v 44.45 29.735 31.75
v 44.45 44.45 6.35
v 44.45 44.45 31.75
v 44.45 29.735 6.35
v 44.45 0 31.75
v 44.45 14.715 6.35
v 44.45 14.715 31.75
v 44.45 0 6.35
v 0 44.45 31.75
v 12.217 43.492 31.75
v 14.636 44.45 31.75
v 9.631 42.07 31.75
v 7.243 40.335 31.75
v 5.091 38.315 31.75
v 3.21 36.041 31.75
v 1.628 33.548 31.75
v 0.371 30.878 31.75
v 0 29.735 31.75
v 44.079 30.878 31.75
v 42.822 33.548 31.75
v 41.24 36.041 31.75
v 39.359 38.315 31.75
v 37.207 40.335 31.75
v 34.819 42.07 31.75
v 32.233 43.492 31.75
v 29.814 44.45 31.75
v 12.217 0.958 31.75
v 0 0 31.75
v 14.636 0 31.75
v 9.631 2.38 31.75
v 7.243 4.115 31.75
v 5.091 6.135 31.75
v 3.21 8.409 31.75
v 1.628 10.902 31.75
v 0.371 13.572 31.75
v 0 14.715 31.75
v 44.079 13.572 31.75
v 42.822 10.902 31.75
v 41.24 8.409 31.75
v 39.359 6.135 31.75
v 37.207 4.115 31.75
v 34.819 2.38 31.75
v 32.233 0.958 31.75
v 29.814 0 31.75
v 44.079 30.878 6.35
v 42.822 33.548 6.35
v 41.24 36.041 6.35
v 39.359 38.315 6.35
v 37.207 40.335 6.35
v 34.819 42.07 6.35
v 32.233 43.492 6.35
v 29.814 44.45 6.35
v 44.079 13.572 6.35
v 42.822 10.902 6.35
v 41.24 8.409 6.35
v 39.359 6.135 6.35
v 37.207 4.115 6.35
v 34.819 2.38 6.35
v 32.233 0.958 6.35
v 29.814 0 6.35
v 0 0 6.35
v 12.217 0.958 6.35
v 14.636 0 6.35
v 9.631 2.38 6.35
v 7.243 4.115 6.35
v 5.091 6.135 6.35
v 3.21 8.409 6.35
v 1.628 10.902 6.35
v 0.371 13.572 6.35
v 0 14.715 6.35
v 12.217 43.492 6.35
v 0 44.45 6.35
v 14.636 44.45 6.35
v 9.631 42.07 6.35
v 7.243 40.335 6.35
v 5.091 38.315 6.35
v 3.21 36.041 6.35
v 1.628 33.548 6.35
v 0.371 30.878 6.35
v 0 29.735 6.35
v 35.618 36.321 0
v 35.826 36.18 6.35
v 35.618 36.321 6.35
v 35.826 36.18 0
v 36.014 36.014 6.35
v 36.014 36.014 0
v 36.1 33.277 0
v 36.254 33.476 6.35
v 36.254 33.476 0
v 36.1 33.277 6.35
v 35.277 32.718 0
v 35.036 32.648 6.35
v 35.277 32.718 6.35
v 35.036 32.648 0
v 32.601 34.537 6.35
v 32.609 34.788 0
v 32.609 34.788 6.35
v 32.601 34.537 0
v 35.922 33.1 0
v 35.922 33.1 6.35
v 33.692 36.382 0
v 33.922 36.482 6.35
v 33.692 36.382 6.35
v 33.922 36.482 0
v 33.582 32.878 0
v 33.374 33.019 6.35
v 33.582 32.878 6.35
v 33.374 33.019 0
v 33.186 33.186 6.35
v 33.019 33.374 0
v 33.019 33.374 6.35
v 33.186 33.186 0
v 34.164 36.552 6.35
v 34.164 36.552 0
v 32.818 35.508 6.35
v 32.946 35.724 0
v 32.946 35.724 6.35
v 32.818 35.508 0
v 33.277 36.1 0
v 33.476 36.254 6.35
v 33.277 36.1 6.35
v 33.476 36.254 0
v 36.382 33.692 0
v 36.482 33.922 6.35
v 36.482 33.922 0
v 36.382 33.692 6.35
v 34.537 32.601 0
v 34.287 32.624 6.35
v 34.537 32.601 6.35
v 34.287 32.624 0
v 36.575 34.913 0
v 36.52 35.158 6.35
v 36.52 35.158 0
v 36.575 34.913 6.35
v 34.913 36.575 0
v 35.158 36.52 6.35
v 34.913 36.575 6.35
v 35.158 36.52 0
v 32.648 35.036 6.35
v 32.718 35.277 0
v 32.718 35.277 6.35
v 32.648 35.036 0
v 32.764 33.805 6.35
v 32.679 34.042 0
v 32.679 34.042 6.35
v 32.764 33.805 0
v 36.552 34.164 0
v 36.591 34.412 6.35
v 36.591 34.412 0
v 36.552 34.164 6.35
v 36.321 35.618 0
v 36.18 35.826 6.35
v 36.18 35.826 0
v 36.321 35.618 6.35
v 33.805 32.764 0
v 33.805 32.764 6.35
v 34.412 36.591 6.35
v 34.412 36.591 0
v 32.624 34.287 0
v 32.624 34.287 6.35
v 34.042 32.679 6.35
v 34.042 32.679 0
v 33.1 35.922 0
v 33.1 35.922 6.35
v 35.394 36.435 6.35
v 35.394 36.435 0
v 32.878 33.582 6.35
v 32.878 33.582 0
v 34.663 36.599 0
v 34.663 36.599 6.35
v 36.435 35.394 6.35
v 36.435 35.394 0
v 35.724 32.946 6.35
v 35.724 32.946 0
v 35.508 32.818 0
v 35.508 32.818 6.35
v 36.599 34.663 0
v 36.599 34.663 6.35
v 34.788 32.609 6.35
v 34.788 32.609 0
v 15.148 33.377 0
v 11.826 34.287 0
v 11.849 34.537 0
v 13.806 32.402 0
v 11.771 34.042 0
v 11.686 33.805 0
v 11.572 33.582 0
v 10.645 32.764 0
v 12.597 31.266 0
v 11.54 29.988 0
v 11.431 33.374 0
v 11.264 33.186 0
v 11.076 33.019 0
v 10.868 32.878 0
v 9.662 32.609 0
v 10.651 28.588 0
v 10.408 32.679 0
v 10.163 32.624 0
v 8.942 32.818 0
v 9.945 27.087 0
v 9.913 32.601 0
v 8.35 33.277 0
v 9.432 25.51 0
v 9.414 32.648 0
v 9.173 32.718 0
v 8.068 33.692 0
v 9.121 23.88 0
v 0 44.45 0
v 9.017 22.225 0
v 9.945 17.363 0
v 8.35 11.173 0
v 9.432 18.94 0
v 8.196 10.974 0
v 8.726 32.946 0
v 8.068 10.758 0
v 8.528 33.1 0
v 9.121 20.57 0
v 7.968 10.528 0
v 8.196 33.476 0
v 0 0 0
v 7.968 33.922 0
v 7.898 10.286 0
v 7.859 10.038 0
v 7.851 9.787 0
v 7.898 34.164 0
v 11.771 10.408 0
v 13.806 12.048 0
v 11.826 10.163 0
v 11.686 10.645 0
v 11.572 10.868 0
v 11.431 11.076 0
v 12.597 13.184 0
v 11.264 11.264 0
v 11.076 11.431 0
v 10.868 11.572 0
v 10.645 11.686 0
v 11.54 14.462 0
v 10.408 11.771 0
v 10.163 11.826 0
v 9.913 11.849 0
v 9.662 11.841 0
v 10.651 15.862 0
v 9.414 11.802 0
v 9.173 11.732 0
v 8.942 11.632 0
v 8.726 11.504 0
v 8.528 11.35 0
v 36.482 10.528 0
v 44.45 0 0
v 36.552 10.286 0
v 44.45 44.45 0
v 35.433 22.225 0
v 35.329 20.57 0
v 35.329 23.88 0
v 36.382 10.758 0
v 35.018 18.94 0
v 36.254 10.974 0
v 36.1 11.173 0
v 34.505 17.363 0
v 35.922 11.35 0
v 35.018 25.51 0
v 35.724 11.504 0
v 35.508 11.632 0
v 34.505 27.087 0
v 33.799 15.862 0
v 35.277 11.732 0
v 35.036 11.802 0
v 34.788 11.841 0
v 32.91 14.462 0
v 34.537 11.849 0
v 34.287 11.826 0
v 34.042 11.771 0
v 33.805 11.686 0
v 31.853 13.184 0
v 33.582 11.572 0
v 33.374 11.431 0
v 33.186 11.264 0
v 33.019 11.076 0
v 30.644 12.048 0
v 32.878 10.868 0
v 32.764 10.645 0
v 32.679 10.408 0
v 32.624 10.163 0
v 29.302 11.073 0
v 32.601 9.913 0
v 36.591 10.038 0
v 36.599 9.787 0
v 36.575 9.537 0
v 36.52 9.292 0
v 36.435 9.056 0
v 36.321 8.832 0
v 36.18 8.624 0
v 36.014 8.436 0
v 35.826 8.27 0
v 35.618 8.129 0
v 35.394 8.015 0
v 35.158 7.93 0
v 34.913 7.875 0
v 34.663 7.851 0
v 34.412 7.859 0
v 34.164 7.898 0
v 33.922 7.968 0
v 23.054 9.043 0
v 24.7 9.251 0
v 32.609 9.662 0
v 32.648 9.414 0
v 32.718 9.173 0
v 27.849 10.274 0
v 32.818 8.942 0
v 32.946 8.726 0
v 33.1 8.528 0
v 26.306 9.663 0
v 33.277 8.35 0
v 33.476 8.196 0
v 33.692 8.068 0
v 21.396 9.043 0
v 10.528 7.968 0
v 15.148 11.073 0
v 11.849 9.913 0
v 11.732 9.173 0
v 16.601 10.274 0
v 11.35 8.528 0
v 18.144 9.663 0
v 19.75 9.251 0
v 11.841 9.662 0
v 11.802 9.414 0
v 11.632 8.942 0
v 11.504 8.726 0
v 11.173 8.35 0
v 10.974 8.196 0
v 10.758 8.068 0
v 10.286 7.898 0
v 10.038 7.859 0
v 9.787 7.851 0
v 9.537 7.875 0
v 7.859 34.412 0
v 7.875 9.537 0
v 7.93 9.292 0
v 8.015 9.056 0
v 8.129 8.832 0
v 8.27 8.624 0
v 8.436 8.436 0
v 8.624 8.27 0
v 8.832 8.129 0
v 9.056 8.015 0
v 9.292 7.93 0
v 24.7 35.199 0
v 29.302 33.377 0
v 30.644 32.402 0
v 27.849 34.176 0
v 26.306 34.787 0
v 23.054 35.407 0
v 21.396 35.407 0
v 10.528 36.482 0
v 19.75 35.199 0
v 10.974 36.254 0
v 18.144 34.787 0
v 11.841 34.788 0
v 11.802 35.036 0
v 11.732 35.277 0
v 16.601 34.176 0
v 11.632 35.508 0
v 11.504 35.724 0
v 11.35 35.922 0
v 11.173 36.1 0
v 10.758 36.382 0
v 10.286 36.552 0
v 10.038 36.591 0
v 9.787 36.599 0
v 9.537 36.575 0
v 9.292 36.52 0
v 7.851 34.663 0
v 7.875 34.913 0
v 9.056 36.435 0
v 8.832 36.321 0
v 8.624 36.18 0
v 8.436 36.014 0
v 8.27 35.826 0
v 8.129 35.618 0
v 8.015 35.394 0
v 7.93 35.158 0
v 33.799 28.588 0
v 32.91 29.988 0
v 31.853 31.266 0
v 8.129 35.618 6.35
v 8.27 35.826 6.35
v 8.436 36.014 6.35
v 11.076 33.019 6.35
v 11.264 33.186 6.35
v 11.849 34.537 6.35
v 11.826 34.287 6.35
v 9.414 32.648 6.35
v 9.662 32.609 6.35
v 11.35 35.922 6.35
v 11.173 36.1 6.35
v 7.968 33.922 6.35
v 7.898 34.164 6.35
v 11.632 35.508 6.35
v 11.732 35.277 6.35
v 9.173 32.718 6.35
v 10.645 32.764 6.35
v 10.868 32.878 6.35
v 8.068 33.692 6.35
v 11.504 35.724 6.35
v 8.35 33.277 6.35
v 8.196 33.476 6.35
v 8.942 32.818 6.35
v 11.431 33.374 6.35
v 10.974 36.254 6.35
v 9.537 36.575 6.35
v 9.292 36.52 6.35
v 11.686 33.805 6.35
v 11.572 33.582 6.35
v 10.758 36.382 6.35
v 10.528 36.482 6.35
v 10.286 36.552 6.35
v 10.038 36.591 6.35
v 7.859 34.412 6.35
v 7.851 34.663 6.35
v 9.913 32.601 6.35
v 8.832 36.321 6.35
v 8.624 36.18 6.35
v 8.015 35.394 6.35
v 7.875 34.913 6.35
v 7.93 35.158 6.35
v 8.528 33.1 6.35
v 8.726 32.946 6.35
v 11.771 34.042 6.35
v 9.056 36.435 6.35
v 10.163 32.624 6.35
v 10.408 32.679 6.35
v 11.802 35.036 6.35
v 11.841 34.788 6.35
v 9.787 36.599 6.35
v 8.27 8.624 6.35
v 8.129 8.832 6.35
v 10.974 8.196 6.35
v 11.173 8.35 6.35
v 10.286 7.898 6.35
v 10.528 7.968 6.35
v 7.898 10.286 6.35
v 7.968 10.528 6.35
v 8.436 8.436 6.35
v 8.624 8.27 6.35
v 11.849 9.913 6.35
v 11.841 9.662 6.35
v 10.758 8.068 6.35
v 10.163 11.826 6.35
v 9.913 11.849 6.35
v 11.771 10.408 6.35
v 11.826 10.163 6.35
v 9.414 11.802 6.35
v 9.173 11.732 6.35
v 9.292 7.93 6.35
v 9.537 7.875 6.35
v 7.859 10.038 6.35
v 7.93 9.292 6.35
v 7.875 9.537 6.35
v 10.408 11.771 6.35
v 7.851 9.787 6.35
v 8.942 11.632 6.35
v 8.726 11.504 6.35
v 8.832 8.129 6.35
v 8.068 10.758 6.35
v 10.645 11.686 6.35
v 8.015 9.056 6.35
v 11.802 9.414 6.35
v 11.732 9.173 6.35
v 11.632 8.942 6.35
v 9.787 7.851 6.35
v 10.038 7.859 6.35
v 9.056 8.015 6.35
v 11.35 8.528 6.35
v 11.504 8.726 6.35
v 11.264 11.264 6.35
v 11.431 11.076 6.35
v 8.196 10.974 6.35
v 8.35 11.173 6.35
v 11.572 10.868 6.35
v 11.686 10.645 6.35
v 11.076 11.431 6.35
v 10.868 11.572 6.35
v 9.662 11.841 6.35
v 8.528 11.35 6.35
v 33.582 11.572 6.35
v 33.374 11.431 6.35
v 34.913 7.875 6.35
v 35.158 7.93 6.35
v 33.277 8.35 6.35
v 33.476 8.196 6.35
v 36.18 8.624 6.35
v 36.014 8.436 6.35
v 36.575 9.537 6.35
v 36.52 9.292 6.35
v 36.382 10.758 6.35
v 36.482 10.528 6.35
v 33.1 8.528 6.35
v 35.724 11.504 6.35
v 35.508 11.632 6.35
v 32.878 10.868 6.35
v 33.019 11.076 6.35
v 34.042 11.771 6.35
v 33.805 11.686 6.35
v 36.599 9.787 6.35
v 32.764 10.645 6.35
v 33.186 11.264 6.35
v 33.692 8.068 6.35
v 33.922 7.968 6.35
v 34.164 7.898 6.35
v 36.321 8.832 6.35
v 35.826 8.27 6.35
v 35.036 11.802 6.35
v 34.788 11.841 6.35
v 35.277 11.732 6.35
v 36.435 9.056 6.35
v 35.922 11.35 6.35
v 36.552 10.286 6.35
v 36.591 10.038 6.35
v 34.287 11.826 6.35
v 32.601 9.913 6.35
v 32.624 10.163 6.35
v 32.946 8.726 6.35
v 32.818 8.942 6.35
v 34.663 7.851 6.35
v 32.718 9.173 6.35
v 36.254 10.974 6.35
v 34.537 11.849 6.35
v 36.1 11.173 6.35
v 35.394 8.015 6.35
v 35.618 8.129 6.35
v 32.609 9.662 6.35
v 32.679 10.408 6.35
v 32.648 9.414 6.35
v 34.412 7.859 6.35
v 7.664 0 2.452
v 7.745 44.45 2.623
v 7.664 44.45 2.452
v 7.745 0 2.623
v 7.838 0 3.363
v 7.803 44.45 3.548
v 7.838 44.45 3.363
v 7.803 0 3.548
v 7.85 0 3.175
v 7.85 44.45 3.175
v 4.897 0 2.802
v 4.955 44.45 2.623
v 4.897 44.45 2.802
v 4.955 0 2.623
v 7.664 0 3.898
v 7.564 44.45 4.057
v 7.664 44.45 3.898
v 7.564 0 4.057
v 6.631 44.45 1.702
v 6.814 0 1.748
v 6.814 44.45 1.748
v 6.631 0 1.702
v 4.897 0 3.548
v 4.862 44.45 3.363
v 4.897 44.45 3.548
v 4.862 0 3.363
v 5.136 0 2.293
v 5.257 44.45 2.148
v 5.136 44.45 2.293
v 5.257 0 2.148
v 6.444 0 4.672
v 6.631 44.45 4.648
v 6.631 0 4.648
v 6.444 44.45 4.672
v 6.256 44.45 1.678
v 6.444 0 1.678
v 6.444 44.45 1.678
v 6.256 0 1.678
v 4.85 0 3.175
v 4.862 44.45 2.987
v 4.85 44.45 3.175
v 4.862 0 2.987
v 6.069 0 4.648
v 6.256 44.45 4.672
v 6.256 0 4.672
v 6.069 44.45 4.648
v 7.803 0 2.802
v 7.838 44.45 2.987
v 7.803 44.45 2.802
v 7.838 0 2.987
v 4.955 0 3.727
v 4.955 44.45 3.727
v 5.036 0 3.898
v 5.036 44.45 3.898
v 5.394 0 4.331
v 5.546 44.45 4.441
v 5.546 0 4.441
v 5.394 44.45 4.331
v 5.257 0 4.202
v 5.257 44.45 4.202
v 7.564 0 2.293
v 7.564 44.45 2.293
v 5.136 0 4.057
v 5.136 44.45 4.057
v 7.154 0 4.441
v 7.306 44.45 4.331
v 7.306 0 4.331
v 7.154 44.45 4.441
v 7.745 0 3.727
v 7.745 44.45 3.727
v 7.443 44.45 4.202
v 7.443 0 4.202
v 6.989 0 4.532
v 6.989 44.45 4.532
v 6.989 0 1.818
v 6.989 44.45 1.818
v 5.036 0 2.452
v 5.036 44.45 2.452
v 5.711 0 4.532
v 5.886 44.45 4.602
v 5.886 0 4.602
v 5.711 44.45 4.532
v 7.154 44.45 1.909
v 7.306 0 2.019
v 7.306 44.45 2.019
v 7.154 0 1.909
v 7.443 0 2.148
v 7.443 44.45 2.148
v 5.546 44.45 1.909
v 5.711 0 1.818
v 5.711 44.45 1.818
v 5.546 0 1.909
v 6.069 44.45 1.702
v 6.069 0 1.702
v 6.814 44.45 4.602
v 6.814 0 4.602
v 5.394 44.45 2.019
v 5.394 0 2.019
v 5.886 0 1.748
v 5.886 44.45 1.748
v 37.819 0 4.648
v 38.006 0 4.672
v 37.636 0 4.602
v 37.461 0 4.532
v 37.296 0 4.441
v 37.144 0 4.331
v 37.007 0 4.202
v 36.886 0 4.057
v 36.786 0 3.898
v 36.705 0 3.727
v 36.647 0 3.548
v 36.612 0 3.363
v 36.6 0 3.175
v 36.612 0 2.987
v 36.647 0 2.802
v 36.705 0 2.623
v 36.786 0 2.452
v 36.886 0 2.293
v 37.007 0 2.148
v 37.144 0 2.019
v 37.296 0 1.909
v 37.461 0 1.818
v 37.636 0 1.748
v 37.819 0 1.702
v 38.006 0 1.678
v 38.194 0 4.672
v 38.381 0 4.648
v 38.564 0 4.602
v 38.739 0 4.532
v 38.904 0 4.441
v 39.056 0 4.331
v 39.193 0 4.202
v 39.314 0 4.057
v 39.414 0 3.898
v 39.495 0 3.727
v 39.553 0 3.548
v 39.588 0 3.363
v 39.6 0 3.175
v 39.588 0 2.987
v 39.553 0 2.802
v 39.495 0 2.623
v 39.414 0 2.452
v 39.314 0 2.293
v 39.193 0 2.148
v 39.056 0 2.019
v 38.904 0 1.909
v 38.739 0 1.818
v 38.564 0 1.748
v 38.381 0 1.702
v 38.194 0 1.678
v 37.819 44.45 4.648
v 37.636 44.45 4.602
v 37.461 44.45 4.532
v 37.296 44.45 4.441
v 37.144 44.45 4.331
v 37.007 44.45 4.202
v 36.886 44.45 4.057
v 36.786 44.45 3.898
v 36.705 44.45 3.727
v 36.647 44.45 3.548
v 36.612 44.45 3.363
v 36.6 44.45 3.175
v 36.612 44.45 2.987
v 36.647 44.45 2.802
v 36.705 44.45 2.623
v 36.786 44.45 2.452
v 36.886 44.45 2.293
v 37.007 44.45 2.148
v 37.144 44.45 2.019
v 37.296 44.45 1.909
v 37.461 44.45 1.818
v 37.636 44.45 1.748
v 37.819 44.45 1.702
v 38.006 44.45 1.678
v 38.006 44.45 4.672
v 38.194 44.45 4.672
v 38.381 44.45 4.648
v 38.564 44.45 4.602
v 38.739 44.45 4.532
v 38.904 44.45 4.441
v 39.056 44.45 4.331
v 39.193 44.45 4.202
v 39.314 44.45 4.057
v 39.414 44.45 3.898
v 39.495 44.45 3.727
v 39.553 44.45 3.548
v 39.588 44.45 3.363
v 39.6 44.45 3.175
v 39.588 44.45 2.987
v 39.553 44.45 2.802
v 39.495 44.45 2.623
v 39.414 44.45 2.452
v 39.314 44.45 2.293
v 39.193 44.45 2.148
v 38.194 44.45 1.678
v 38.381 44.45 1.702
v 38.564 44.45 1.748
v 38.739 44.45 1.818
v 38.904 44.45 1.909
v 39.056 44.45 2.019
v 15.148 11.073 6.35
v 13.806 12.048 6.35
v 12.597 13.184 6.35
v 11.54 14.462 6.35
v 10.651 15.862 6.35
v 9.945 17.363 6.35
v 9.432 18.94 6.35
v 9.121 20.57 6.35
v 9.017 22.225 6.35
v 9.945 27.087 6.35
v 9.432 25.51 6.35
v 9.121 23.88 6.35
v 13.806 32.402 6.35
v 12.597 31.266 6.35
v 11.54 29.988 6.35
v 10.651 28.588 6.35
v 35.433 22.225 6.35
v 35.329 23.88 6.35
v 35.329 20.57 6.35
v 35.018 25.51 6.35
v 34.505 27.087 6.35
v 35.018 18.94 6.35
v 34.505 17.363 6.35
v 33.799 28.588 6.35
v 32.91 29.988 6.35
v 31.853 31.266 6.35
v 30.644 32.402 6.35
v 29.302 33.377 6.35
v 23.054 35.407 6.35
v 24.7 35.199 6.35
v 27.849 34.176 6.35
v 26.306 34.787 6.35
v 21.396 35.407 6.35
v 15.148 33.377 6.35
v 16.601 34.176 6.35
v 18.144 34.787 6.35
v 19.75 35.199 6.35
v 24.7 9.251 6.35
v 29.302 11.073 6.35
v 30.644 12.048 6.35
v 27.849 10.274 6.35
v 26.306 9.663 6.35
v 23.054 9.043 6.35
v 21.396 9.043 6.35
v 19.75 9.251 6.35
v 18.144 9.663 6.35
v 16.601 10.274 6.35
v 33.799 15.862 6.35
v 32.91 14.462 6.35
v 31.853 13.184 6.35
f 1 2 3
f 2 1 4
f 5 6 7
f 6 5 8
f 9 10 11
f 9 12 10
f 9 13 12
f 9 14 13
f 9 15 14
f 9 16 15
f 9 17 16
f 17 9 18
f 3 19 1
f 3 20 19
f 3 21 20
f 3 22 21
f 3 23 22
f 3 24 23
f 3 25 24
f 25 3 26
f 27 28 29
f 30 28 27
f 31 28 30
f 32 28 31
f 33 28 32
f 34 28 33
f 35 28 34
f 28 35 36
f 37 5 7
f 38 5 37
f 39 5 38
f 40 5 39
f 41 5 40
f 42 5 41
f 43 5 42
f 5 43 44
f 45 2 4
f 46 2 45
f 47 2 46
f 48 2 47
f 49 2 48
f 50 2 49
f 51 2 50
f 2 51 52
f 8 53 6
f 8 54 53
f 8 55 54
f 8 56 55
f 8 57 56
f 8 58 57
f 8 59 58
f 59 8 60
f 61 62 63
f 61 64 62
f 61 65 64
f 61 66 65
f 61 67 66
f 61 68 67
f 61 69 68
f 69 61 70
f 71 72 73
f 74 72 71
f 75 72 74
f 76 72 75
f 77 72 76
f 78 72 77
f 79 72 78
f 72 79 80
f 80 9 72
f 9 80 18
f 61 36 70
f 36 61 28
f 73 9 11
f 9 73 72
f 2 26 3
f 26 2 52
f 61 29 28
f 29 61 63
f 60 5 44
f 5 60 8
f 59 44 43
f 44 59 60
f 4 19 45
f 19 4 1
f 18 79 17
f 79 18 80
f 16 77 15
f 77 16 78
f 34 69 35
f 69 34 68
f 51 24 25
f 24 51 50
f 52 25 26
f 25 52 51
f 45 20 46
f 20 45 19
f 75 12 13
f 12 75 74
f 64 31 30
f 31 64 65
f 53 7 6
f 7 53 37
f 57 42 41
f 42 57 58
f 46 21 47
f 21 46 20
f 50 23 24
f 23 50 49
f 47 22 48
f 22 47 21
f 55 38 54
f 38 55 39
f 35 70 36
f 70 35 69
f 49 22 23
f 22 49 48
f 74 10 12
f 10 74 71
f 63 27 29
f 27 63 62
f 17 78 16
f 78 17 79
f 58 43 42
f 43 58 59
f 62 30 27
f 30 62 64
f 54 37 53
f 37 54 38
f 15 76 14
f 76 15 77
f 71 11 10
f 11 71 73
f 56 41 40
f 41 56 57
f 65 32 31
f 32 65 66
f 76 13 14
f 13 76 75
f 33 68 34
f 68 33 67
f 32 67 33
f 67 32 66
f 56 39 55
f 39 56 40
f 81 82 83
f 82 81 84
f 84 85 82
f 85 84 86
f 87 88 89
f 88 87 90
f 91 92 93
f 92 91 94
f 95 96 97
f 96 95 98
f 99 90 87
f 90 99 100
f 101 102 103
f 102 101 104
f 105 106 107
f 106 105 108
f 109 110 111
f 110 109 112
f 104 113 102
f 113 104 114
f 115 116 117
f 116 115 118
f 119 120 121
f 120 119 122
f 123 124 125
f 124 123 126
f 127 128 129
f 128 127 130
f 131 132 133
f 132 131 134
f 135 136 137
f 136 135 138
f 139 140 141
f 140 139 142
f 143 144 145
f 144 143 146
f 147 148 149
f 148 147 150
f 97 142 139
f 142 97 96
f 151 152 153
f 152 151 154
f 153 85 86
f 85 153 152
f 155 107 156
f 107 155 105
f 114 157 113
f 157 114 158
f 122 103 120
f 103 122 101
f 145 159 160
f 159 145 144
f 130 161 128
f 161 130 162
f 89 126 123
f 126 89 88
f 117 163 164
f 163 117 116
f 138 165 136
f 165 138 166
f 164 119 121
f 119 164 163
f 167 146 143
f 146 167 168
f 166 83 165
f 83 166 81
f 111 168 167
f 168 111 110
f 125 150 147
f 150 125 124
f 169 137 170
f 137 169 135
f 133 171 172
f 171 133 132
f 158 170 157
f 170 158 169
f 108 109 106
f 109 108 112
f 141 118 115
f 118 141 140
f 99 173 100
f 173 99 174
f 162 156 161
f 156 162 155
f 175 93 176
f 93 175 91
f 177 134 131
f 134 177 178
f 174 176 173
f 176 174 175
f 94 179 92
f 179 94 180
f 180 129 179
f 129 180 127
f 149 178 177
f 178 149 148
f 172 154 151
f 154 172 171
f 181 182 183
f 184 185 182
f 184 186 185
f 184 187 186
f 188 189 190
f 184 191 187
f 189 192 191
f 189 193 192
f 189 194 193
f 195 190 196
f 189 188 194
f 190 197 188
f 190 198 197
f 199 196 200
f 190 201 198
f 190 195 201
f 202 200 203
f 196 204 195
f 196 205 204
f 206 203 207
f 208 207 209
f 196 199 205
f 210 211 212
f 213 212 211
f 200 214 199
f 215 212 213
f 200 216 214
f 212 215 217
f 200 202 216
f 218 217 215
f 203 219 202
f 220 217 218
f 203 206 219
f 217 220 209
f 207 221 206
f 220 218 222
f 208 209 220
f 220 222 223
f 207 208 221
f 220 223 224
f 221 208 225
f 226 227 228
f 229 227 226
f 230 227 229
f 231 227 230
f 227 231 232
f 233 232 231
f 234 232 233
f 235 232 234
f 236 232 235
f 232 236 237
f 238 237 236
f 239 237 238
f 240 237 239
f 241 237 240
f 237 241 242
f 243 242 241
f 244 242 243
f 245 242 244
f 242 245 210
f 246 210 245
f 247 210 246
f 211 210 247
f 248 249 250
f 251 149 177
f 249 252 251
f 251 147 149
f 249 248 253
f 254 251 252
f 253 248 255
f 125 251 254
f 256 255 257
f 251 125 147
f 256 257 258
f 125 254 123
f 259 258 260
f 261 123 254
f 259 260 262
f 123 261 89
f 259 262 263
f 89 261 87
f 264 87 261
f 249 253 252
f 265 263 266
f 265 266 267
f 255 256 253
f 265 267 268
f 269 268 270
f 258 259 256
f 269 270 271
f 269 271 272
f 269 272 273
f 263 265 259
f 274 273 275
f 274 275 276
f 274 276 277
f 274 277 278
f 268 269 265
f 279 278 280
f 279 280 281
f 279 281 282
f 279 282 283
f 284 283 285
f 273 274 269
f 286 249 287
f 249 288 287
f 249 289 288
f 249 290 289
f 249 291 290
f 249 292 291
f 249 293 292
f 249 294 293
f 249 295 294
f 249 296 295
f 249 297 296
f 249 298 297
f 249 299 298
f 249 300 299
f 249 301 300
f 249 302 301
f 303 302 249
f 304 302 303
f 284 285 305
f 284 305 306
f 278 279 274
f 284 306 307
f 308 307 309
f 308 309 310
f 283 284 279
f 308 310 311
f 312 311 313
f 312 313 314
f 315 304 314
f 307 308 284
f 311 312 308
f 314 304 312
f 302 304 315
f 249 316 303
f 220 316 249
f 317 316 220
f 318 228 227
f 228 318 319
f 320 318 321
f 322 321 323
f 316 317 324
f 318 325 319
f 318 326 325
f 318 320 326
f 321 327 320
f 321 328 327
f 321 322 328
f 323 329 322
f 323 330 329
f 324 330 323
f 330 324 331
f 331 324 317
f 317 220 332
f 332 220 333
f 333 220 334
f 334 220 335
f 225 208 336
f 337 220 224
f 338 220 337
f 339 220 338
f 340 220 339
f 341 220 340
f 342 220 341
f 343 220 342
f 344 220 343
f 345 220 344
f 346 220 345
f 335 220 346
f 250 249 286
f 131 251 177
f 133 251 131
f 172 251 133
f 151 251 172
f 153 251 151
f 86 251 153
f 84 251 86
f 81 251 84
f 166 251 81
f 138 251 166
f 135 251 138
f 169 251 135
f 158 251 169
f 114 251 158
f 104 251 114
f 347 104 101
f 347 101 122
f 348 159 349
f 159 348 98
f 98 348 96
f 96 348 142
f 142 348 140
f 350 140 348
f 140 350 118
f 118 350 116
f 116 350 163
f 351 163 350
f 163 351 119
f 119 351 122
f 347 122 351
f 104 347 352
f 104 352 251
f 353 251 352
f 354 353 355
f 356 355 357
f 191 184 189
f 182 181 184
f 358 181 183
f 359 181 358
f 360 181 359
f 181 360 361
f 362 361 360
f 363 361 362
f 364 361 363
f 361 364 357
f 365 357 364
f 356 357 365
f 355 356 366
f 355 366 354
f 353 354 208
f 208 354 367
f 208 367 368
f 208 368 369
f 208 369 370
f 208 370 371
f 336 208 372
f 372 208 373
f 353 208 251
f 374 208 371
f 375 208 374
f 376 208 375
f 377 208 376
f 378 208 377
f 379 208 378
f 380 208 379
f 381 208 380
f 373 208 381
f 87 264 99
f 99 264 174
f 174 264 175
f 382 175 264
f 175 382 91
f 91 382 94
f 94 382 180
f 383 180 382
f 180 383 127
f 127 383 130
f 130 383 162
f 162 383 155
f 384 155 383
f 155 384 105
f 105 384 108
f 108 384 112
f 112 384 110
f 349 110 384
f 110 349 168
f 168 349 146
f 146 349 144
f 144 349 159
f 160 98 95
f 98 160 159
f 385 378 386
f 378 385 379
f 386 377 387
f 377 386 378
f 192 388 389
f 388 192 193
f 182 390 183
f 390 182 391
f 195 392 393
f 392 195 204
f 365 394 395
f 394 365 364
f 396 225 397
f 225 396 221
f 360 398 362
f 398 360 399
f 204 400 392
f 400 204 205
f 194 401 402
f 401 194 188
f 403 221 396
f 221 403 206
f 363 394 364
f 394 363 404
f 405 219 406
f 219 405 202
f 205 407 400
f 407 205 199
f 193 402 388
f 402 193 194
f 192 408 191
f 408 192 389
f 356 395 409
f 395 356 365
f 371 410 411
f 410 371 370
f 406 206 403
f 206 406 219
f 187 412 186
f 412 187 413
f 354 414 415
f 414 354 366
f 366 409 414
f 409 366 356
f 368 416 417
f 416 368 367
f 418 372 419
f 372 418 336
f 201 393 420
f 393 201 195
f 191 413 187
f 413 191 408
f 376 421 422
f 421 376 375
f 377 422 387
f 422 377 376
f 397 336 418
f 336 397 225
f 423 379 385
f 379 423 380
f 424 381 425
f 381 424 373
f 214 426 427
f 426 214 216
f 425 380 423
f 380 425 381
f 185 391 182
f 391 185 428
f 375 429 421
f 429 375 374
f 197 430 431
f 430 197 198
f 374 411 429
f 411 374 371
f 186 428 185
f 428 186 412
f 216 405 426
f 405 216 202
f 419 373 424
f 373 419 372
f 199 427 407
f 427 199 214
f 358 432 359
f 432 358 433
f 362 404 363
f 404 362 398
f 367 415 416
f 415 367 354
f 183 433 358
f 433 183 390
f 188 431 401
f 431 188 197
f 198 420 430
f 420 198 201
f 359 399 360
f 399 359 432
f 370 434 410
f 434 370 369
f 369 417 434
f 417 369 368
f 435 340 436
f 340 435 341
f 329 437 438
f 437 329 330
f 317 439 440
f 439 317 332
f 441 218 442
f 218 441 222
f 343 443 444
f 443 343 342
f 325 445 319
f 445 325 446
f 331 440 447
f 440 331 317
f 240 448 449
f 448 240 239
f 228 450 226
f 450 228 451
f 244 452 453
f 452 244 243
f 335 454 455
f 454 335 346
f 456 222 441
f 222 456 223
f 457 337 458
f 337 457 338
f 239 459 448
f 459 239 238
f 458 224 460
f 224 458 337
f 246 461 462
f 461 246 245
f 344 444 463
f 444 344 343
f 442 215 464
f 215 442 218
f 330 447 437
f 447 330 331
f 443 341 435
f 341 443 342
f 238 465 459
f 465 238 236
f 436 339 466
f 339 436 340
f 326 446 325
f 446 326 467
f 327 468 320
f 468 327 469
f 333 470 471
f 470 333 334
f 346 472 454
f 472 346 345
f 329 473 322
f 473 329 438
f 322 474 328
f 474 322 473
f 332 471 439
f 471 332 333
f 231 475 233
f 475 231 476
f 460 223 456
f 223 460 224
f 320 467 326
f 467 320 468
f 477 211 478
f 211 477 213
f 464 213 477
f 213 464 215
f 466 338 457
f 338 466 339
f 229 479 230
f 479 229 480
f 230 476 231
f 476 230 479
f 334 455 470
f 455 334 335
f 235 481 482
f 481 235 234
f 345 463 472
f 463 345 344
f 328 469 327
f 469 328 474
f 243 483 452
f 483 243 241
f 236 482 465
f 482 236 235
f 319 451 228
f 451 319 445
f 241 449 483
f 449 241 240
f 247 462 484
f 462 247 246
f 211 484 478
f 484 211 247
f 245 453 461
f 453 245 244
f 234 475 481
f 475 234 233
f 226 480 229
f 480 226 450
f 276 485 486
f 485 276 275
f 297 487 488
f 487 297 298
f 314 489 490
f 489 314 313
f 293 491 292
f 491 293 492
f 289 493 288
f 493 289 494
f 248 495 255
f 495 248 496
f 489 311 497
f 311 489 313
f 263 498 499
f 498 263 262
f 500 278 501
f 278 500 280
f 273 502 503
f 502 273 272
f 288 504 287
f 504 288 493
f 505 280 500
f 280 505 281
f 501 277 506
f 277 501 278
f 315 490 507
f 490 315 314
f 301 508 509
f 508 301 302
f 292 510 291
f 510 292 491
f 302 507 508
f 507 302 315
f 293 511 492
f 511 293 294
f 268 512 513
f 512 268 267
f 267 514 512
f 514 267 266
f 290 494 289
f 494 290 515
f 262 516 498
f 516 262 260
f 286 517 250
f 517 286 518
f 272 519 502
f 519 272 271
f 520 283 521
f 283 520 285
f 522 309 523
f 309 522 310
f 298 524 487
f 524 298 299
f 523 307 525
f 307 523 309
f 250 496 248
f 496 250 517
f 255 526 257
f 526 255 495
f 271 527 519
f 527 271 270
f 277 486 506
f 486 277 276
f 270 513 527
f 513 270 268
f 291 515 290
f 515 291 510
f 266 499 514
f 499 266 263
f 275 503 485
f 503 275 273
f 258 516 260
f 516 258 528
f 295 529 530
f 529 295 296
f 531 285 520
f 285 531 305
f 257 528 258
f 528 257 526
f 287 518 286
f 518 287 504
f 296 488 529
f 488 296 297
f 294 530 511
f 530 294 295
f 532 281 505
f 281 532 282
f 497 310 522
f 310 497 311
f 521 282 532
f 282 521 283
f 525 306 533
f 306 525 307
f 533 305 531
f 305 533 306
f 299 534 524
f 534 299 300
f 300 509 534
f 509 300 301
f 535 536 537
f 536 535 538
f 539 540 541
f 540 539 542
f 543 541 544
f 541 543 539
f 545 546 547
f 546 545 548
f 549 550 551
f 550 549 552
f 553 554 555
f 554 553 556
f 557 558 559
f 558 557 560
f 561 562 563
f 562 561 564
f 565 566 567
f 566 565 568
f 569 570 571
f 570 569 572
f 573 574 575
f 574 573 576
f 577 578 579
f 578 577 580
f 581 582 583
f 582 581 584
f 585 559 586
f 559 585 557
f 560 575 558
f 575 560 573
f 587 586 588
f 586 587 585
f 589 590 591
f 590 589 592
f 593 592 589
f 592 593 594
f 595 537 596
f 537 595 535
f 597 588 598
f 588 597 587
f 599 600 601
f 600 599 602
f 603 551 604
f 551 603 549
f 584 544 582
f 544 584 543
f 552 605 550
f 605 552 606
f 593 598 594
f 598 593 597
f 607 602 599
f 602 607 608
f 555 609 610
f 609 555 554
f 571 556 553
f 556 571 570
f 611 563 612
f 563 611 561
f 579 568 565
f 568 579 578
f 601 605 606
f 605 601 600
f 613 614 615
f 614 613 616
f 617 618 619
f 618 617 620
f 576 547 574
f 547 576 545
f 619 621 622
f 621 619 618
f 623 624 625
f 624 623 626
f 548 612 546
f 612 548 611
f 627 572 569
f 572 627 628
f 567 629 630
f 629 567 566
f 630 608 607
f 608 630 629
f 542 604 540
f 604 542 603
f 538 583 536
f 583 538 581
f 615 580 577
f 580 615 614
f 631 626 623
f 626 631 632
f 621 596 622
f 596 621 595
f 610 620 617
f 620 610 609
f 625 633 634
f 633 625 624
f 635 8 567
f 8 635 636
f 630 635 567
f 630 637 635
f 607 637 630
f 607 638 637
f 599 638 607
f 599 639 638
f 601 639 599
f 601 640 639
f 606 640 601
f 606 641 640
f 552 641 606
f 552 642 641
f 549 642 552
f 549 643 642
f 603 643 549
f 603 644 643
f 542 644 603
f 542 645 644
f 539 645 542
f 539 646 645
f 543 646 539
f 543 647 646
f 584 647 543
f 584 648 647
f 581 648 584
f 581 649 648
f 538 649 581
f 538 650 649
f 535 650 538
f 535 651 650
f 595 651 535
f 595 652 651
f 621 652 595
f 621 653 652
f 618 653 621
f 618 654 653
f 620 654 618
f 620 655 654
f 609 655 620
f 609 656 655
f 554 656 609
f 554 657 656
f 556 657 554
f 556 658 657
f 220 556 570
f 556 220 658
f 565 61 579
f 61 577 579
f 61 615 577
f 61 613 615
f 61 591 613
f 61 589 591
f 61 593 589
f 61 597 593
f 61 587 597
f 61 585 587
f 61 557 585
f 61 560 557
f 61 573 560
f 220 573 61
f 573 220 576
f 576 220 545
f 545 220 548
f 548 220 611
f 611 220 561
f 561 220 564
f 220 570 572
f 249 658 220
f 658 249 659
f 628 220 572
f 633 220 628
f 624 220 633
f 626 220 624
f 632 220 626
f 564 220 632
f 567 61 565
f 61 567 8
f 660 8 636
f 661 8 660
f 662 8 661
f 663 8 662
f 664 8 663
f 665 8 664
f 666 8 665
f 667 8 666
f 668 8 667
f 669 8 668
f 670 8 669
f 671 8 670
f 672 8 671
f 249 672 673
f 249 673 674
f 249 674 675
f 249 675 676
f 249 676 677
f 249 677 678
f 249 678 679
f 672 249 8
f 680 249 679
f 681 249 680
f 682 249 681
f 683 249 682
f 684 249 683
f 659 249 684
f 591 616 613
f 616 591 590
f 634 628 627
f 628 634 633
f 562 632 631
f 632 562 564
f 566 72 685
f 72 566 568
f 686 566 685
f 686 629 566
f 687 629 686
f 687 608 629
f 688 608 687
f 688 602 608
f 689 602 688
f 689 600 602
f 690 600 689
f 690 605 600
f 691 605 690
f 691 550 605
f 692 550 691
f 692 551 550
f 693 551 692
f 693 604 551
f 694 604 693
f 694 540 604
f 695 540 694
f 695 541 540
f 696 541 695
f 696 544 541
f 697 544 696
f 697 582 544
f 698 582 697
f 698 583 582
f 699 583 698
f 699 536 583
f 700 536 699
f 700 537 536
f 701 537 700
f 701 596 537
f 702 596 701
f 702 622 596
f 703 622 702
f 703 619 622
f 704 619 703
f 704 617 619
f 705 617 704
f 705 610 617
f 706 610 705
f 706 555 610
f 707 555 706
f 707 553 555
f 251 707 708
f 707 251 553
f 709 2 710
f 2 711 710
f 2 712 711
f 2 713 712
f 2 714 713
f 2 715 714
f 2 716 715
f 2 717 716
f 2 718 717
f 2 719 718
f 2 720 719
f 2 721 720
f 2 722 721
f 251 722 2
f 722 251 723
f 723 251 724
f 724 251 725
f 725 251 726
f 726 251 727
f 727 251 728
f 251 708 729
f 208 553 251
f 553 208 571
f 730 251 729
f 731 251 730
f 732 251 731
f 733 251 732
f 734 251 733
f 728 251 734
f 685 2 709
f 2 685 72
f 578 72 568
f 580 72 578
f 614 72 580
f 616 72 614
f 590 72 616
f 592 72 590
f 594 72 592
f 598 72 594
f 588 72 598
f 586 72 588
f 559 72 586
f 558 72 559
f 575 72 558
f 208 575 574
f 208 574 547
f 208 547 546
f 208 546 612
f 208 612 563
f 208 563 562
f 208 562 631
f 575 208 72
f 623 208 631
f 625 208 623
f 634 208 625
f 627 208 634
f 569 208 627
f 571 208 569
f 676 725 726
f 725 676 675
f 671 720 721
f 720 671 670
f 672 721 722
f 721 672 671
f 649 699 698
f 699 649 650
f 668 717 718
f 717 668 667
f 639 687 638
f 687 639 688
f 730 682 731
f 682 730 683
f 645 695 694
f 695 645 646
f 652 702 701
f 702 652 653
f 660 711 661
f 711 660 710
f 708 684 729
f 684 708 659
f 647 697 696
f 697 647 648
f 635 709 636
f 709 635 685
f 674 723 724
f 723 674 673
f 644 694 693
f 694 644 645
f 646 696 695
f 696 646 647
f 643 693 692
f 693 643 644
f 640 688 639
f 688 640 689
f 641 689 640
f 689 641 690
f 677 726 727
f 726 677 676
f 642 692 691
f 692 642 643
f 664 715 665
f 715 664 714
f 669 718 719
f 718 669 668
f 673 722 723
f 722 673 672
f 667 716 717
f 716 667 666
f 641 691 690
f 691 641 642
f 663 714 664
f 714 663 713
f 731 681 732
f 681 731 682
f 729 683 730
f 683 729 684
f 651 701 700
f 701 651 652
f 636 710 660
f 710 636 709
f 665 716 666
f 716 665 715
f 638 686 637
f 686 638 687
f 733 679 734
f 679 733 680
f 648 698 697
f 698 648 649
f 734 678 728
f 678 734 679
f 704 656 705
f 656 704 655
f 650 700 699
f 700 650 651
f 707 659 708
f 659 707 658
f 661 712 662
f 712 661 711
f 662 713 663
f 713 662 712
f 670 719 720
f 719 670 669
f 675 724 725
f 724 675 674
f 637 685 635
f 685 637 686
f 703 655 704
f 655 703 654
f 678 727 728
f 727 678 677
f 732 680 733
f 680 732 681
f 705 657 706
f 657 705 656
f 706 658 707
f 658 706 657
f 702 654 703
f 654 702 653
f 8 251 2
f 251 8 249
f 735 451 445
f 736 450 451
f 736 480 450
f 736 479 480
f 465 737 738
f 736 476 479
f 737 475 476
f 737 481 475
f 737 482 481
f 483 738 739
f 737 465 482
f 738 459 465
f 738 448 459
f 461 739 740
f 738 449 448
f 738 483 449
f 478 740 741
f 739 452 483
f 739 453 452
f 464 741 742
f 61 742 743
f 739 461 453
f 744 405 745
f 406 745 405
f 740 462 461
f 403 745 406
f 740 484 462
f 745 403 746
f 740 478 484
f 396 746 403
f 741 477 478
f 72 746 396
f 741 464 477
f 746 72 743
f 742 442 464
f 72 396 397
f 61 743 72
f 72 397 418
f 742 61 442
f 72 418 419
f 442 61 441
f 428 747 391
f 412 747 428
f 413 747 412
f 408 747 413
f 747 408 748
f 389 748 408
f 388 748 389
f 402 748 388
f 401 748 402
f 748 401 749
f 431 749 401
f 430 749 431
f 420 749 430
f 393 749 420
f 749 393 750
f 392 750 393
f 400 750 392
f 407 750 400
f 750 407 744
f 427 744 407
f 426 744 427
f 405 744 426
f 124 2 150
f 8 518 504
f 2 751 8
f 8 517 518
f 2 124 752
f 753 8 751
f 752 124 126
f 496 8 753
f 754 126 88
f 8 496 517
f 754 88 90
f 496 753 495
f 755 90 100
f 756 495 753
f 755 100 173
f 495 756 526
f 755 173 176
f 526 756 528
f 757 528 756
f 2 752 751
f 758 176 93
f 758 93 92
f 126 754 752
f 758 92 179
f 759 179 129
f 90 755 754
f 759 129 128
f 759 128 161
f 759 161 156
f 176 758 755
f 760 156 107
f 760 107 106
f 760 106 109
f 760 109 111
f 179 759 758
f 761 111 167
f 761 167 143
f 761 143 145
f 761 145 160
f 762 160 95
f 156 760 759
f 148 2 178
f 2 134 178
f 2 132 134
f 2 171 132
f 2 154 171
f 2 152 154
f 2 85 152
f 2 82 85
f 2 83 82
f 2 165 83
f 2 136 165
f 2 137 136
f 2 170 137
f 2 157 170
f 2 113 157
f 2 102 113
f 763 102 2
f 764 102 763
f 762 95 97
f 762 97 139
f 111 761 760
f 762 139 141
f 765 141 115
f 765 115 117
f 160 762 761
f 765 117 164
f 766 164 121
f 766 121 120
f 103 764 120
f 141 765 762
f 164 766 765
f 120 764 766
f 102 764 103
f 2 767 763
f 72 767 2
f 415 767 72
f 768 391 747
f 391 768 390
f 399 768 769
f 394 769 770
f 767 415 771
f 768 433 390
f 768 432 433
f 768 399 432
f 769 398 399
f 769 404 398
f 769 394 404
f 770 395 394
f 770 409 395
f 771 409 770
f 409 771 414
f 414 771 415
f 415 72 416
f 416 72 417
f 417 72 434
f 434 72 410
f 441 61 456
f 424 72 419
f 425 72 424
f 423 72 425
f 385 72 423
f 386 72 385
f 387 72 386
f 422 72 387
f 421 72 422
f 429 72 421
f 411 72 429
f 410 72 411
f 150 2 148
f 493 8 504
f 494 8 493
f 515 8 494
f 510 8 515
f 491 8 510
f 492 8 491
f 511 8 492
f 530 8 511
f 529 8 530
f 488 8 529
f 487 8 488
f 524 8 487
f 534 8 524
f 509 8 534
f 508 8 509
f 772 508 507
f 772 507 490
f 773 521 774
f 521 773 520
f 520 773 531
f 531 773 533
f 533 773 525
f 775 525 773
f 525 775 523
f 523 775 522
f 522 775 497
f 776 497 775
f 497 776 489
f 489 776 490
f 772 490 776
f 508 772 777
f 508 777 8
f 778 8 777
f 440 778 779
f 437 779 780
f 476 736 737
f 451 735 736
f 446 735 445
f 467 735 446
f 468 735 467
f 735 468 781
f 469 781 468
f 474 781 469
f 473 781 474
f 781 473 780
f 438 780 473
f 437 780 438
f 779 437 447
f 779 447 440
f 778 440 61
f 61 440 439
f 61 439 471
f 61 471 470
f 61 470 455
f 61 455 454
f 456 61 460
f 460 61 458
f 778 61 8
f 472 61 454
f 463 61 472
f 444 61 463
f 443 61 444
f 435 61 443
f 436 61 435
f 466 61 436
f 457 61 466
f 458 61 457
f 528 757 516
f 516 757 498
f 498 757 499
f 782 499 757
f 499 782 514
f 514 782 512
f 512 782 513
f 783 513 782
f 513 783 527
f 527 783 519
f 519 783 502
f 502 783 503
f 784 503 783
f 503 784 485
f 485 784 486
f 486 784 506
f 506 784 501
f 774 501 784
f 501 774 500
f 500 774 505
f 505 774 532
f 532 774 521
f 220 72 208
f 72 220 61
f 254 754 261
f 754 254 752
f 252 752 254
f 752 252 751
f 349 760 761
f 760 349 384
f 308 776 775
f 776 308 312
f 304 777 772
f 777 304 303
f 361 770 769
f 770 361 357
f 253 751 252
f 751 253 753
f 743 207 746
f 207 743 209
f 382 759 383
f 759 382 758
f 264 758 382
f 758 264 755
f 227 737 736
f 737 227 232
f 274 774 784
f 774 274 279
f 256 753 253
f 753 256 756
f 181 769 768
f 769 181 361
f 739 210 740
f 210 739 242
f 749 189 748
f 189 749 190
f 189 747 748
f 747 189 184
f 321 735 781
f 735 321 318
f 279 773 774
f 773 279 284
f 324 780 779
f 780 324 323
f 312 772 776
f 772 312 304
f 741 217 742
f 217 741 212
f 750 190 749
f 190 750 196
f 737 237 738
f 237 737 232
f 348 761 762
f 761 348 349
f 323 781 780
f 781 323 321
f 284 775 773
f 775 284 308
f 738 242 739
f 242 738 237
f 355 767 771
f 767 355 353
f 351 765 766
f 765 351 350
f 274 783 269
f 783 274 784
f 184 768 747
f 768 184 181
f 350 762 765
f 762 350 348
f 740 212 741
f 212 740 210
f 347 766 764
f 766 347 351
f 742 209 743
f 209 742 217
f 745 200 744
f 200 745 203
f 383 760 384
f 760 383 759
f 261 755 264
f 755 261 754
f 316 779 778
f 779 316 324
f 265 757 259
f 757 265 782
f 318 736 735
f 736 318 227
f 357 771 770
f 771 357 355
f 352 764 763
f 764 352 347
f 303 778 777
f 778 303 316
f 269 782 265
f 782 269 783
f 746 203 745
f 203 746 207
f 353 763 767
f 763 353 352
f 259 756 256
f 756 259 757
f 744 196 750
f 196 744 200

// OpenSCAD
//mount for a andymark p71 gear box to fit in a 2"x2"x1/8"wall c-channel

in=25.4;
wbox=1.75*in;
lmotor=1*in;
hfront = 0.25*in;
dmotor=1.772*in+2;
dshaft=1.04*in;
dholes=1.378*in;

$fn=50;
union() {
    translate([0, 0, hfront]) 
        difference() {
            cube([wbox, wbox, lmotor]);
            translate([wbox/2, wbox/2, 0]) cylinder(d=dmotor, h=lmotor);
        }
    difference() {
        cube([wbox, wbox, hfront]);
        translate([wbox/2, wbox/2, 0]) cylinder(d=dshaft, h=lmotor);
        for (i=[45, 135, 225, 315]) {
            translate([wbox/2, wbox/2, 0]) rotate([0, 0, i]) translate([dholes/2, 0, 0]) cylinder(d=4, h=lmotor);
        }
        for (i=[0.25*in, wbox-0.25*in]) {
            depth=wbox; //0.3*in;
            #translate([i, depth, hfront/2]) rotate([90, 0, 0]) cylinder(d=3, h=depth);
        }
    }
}
